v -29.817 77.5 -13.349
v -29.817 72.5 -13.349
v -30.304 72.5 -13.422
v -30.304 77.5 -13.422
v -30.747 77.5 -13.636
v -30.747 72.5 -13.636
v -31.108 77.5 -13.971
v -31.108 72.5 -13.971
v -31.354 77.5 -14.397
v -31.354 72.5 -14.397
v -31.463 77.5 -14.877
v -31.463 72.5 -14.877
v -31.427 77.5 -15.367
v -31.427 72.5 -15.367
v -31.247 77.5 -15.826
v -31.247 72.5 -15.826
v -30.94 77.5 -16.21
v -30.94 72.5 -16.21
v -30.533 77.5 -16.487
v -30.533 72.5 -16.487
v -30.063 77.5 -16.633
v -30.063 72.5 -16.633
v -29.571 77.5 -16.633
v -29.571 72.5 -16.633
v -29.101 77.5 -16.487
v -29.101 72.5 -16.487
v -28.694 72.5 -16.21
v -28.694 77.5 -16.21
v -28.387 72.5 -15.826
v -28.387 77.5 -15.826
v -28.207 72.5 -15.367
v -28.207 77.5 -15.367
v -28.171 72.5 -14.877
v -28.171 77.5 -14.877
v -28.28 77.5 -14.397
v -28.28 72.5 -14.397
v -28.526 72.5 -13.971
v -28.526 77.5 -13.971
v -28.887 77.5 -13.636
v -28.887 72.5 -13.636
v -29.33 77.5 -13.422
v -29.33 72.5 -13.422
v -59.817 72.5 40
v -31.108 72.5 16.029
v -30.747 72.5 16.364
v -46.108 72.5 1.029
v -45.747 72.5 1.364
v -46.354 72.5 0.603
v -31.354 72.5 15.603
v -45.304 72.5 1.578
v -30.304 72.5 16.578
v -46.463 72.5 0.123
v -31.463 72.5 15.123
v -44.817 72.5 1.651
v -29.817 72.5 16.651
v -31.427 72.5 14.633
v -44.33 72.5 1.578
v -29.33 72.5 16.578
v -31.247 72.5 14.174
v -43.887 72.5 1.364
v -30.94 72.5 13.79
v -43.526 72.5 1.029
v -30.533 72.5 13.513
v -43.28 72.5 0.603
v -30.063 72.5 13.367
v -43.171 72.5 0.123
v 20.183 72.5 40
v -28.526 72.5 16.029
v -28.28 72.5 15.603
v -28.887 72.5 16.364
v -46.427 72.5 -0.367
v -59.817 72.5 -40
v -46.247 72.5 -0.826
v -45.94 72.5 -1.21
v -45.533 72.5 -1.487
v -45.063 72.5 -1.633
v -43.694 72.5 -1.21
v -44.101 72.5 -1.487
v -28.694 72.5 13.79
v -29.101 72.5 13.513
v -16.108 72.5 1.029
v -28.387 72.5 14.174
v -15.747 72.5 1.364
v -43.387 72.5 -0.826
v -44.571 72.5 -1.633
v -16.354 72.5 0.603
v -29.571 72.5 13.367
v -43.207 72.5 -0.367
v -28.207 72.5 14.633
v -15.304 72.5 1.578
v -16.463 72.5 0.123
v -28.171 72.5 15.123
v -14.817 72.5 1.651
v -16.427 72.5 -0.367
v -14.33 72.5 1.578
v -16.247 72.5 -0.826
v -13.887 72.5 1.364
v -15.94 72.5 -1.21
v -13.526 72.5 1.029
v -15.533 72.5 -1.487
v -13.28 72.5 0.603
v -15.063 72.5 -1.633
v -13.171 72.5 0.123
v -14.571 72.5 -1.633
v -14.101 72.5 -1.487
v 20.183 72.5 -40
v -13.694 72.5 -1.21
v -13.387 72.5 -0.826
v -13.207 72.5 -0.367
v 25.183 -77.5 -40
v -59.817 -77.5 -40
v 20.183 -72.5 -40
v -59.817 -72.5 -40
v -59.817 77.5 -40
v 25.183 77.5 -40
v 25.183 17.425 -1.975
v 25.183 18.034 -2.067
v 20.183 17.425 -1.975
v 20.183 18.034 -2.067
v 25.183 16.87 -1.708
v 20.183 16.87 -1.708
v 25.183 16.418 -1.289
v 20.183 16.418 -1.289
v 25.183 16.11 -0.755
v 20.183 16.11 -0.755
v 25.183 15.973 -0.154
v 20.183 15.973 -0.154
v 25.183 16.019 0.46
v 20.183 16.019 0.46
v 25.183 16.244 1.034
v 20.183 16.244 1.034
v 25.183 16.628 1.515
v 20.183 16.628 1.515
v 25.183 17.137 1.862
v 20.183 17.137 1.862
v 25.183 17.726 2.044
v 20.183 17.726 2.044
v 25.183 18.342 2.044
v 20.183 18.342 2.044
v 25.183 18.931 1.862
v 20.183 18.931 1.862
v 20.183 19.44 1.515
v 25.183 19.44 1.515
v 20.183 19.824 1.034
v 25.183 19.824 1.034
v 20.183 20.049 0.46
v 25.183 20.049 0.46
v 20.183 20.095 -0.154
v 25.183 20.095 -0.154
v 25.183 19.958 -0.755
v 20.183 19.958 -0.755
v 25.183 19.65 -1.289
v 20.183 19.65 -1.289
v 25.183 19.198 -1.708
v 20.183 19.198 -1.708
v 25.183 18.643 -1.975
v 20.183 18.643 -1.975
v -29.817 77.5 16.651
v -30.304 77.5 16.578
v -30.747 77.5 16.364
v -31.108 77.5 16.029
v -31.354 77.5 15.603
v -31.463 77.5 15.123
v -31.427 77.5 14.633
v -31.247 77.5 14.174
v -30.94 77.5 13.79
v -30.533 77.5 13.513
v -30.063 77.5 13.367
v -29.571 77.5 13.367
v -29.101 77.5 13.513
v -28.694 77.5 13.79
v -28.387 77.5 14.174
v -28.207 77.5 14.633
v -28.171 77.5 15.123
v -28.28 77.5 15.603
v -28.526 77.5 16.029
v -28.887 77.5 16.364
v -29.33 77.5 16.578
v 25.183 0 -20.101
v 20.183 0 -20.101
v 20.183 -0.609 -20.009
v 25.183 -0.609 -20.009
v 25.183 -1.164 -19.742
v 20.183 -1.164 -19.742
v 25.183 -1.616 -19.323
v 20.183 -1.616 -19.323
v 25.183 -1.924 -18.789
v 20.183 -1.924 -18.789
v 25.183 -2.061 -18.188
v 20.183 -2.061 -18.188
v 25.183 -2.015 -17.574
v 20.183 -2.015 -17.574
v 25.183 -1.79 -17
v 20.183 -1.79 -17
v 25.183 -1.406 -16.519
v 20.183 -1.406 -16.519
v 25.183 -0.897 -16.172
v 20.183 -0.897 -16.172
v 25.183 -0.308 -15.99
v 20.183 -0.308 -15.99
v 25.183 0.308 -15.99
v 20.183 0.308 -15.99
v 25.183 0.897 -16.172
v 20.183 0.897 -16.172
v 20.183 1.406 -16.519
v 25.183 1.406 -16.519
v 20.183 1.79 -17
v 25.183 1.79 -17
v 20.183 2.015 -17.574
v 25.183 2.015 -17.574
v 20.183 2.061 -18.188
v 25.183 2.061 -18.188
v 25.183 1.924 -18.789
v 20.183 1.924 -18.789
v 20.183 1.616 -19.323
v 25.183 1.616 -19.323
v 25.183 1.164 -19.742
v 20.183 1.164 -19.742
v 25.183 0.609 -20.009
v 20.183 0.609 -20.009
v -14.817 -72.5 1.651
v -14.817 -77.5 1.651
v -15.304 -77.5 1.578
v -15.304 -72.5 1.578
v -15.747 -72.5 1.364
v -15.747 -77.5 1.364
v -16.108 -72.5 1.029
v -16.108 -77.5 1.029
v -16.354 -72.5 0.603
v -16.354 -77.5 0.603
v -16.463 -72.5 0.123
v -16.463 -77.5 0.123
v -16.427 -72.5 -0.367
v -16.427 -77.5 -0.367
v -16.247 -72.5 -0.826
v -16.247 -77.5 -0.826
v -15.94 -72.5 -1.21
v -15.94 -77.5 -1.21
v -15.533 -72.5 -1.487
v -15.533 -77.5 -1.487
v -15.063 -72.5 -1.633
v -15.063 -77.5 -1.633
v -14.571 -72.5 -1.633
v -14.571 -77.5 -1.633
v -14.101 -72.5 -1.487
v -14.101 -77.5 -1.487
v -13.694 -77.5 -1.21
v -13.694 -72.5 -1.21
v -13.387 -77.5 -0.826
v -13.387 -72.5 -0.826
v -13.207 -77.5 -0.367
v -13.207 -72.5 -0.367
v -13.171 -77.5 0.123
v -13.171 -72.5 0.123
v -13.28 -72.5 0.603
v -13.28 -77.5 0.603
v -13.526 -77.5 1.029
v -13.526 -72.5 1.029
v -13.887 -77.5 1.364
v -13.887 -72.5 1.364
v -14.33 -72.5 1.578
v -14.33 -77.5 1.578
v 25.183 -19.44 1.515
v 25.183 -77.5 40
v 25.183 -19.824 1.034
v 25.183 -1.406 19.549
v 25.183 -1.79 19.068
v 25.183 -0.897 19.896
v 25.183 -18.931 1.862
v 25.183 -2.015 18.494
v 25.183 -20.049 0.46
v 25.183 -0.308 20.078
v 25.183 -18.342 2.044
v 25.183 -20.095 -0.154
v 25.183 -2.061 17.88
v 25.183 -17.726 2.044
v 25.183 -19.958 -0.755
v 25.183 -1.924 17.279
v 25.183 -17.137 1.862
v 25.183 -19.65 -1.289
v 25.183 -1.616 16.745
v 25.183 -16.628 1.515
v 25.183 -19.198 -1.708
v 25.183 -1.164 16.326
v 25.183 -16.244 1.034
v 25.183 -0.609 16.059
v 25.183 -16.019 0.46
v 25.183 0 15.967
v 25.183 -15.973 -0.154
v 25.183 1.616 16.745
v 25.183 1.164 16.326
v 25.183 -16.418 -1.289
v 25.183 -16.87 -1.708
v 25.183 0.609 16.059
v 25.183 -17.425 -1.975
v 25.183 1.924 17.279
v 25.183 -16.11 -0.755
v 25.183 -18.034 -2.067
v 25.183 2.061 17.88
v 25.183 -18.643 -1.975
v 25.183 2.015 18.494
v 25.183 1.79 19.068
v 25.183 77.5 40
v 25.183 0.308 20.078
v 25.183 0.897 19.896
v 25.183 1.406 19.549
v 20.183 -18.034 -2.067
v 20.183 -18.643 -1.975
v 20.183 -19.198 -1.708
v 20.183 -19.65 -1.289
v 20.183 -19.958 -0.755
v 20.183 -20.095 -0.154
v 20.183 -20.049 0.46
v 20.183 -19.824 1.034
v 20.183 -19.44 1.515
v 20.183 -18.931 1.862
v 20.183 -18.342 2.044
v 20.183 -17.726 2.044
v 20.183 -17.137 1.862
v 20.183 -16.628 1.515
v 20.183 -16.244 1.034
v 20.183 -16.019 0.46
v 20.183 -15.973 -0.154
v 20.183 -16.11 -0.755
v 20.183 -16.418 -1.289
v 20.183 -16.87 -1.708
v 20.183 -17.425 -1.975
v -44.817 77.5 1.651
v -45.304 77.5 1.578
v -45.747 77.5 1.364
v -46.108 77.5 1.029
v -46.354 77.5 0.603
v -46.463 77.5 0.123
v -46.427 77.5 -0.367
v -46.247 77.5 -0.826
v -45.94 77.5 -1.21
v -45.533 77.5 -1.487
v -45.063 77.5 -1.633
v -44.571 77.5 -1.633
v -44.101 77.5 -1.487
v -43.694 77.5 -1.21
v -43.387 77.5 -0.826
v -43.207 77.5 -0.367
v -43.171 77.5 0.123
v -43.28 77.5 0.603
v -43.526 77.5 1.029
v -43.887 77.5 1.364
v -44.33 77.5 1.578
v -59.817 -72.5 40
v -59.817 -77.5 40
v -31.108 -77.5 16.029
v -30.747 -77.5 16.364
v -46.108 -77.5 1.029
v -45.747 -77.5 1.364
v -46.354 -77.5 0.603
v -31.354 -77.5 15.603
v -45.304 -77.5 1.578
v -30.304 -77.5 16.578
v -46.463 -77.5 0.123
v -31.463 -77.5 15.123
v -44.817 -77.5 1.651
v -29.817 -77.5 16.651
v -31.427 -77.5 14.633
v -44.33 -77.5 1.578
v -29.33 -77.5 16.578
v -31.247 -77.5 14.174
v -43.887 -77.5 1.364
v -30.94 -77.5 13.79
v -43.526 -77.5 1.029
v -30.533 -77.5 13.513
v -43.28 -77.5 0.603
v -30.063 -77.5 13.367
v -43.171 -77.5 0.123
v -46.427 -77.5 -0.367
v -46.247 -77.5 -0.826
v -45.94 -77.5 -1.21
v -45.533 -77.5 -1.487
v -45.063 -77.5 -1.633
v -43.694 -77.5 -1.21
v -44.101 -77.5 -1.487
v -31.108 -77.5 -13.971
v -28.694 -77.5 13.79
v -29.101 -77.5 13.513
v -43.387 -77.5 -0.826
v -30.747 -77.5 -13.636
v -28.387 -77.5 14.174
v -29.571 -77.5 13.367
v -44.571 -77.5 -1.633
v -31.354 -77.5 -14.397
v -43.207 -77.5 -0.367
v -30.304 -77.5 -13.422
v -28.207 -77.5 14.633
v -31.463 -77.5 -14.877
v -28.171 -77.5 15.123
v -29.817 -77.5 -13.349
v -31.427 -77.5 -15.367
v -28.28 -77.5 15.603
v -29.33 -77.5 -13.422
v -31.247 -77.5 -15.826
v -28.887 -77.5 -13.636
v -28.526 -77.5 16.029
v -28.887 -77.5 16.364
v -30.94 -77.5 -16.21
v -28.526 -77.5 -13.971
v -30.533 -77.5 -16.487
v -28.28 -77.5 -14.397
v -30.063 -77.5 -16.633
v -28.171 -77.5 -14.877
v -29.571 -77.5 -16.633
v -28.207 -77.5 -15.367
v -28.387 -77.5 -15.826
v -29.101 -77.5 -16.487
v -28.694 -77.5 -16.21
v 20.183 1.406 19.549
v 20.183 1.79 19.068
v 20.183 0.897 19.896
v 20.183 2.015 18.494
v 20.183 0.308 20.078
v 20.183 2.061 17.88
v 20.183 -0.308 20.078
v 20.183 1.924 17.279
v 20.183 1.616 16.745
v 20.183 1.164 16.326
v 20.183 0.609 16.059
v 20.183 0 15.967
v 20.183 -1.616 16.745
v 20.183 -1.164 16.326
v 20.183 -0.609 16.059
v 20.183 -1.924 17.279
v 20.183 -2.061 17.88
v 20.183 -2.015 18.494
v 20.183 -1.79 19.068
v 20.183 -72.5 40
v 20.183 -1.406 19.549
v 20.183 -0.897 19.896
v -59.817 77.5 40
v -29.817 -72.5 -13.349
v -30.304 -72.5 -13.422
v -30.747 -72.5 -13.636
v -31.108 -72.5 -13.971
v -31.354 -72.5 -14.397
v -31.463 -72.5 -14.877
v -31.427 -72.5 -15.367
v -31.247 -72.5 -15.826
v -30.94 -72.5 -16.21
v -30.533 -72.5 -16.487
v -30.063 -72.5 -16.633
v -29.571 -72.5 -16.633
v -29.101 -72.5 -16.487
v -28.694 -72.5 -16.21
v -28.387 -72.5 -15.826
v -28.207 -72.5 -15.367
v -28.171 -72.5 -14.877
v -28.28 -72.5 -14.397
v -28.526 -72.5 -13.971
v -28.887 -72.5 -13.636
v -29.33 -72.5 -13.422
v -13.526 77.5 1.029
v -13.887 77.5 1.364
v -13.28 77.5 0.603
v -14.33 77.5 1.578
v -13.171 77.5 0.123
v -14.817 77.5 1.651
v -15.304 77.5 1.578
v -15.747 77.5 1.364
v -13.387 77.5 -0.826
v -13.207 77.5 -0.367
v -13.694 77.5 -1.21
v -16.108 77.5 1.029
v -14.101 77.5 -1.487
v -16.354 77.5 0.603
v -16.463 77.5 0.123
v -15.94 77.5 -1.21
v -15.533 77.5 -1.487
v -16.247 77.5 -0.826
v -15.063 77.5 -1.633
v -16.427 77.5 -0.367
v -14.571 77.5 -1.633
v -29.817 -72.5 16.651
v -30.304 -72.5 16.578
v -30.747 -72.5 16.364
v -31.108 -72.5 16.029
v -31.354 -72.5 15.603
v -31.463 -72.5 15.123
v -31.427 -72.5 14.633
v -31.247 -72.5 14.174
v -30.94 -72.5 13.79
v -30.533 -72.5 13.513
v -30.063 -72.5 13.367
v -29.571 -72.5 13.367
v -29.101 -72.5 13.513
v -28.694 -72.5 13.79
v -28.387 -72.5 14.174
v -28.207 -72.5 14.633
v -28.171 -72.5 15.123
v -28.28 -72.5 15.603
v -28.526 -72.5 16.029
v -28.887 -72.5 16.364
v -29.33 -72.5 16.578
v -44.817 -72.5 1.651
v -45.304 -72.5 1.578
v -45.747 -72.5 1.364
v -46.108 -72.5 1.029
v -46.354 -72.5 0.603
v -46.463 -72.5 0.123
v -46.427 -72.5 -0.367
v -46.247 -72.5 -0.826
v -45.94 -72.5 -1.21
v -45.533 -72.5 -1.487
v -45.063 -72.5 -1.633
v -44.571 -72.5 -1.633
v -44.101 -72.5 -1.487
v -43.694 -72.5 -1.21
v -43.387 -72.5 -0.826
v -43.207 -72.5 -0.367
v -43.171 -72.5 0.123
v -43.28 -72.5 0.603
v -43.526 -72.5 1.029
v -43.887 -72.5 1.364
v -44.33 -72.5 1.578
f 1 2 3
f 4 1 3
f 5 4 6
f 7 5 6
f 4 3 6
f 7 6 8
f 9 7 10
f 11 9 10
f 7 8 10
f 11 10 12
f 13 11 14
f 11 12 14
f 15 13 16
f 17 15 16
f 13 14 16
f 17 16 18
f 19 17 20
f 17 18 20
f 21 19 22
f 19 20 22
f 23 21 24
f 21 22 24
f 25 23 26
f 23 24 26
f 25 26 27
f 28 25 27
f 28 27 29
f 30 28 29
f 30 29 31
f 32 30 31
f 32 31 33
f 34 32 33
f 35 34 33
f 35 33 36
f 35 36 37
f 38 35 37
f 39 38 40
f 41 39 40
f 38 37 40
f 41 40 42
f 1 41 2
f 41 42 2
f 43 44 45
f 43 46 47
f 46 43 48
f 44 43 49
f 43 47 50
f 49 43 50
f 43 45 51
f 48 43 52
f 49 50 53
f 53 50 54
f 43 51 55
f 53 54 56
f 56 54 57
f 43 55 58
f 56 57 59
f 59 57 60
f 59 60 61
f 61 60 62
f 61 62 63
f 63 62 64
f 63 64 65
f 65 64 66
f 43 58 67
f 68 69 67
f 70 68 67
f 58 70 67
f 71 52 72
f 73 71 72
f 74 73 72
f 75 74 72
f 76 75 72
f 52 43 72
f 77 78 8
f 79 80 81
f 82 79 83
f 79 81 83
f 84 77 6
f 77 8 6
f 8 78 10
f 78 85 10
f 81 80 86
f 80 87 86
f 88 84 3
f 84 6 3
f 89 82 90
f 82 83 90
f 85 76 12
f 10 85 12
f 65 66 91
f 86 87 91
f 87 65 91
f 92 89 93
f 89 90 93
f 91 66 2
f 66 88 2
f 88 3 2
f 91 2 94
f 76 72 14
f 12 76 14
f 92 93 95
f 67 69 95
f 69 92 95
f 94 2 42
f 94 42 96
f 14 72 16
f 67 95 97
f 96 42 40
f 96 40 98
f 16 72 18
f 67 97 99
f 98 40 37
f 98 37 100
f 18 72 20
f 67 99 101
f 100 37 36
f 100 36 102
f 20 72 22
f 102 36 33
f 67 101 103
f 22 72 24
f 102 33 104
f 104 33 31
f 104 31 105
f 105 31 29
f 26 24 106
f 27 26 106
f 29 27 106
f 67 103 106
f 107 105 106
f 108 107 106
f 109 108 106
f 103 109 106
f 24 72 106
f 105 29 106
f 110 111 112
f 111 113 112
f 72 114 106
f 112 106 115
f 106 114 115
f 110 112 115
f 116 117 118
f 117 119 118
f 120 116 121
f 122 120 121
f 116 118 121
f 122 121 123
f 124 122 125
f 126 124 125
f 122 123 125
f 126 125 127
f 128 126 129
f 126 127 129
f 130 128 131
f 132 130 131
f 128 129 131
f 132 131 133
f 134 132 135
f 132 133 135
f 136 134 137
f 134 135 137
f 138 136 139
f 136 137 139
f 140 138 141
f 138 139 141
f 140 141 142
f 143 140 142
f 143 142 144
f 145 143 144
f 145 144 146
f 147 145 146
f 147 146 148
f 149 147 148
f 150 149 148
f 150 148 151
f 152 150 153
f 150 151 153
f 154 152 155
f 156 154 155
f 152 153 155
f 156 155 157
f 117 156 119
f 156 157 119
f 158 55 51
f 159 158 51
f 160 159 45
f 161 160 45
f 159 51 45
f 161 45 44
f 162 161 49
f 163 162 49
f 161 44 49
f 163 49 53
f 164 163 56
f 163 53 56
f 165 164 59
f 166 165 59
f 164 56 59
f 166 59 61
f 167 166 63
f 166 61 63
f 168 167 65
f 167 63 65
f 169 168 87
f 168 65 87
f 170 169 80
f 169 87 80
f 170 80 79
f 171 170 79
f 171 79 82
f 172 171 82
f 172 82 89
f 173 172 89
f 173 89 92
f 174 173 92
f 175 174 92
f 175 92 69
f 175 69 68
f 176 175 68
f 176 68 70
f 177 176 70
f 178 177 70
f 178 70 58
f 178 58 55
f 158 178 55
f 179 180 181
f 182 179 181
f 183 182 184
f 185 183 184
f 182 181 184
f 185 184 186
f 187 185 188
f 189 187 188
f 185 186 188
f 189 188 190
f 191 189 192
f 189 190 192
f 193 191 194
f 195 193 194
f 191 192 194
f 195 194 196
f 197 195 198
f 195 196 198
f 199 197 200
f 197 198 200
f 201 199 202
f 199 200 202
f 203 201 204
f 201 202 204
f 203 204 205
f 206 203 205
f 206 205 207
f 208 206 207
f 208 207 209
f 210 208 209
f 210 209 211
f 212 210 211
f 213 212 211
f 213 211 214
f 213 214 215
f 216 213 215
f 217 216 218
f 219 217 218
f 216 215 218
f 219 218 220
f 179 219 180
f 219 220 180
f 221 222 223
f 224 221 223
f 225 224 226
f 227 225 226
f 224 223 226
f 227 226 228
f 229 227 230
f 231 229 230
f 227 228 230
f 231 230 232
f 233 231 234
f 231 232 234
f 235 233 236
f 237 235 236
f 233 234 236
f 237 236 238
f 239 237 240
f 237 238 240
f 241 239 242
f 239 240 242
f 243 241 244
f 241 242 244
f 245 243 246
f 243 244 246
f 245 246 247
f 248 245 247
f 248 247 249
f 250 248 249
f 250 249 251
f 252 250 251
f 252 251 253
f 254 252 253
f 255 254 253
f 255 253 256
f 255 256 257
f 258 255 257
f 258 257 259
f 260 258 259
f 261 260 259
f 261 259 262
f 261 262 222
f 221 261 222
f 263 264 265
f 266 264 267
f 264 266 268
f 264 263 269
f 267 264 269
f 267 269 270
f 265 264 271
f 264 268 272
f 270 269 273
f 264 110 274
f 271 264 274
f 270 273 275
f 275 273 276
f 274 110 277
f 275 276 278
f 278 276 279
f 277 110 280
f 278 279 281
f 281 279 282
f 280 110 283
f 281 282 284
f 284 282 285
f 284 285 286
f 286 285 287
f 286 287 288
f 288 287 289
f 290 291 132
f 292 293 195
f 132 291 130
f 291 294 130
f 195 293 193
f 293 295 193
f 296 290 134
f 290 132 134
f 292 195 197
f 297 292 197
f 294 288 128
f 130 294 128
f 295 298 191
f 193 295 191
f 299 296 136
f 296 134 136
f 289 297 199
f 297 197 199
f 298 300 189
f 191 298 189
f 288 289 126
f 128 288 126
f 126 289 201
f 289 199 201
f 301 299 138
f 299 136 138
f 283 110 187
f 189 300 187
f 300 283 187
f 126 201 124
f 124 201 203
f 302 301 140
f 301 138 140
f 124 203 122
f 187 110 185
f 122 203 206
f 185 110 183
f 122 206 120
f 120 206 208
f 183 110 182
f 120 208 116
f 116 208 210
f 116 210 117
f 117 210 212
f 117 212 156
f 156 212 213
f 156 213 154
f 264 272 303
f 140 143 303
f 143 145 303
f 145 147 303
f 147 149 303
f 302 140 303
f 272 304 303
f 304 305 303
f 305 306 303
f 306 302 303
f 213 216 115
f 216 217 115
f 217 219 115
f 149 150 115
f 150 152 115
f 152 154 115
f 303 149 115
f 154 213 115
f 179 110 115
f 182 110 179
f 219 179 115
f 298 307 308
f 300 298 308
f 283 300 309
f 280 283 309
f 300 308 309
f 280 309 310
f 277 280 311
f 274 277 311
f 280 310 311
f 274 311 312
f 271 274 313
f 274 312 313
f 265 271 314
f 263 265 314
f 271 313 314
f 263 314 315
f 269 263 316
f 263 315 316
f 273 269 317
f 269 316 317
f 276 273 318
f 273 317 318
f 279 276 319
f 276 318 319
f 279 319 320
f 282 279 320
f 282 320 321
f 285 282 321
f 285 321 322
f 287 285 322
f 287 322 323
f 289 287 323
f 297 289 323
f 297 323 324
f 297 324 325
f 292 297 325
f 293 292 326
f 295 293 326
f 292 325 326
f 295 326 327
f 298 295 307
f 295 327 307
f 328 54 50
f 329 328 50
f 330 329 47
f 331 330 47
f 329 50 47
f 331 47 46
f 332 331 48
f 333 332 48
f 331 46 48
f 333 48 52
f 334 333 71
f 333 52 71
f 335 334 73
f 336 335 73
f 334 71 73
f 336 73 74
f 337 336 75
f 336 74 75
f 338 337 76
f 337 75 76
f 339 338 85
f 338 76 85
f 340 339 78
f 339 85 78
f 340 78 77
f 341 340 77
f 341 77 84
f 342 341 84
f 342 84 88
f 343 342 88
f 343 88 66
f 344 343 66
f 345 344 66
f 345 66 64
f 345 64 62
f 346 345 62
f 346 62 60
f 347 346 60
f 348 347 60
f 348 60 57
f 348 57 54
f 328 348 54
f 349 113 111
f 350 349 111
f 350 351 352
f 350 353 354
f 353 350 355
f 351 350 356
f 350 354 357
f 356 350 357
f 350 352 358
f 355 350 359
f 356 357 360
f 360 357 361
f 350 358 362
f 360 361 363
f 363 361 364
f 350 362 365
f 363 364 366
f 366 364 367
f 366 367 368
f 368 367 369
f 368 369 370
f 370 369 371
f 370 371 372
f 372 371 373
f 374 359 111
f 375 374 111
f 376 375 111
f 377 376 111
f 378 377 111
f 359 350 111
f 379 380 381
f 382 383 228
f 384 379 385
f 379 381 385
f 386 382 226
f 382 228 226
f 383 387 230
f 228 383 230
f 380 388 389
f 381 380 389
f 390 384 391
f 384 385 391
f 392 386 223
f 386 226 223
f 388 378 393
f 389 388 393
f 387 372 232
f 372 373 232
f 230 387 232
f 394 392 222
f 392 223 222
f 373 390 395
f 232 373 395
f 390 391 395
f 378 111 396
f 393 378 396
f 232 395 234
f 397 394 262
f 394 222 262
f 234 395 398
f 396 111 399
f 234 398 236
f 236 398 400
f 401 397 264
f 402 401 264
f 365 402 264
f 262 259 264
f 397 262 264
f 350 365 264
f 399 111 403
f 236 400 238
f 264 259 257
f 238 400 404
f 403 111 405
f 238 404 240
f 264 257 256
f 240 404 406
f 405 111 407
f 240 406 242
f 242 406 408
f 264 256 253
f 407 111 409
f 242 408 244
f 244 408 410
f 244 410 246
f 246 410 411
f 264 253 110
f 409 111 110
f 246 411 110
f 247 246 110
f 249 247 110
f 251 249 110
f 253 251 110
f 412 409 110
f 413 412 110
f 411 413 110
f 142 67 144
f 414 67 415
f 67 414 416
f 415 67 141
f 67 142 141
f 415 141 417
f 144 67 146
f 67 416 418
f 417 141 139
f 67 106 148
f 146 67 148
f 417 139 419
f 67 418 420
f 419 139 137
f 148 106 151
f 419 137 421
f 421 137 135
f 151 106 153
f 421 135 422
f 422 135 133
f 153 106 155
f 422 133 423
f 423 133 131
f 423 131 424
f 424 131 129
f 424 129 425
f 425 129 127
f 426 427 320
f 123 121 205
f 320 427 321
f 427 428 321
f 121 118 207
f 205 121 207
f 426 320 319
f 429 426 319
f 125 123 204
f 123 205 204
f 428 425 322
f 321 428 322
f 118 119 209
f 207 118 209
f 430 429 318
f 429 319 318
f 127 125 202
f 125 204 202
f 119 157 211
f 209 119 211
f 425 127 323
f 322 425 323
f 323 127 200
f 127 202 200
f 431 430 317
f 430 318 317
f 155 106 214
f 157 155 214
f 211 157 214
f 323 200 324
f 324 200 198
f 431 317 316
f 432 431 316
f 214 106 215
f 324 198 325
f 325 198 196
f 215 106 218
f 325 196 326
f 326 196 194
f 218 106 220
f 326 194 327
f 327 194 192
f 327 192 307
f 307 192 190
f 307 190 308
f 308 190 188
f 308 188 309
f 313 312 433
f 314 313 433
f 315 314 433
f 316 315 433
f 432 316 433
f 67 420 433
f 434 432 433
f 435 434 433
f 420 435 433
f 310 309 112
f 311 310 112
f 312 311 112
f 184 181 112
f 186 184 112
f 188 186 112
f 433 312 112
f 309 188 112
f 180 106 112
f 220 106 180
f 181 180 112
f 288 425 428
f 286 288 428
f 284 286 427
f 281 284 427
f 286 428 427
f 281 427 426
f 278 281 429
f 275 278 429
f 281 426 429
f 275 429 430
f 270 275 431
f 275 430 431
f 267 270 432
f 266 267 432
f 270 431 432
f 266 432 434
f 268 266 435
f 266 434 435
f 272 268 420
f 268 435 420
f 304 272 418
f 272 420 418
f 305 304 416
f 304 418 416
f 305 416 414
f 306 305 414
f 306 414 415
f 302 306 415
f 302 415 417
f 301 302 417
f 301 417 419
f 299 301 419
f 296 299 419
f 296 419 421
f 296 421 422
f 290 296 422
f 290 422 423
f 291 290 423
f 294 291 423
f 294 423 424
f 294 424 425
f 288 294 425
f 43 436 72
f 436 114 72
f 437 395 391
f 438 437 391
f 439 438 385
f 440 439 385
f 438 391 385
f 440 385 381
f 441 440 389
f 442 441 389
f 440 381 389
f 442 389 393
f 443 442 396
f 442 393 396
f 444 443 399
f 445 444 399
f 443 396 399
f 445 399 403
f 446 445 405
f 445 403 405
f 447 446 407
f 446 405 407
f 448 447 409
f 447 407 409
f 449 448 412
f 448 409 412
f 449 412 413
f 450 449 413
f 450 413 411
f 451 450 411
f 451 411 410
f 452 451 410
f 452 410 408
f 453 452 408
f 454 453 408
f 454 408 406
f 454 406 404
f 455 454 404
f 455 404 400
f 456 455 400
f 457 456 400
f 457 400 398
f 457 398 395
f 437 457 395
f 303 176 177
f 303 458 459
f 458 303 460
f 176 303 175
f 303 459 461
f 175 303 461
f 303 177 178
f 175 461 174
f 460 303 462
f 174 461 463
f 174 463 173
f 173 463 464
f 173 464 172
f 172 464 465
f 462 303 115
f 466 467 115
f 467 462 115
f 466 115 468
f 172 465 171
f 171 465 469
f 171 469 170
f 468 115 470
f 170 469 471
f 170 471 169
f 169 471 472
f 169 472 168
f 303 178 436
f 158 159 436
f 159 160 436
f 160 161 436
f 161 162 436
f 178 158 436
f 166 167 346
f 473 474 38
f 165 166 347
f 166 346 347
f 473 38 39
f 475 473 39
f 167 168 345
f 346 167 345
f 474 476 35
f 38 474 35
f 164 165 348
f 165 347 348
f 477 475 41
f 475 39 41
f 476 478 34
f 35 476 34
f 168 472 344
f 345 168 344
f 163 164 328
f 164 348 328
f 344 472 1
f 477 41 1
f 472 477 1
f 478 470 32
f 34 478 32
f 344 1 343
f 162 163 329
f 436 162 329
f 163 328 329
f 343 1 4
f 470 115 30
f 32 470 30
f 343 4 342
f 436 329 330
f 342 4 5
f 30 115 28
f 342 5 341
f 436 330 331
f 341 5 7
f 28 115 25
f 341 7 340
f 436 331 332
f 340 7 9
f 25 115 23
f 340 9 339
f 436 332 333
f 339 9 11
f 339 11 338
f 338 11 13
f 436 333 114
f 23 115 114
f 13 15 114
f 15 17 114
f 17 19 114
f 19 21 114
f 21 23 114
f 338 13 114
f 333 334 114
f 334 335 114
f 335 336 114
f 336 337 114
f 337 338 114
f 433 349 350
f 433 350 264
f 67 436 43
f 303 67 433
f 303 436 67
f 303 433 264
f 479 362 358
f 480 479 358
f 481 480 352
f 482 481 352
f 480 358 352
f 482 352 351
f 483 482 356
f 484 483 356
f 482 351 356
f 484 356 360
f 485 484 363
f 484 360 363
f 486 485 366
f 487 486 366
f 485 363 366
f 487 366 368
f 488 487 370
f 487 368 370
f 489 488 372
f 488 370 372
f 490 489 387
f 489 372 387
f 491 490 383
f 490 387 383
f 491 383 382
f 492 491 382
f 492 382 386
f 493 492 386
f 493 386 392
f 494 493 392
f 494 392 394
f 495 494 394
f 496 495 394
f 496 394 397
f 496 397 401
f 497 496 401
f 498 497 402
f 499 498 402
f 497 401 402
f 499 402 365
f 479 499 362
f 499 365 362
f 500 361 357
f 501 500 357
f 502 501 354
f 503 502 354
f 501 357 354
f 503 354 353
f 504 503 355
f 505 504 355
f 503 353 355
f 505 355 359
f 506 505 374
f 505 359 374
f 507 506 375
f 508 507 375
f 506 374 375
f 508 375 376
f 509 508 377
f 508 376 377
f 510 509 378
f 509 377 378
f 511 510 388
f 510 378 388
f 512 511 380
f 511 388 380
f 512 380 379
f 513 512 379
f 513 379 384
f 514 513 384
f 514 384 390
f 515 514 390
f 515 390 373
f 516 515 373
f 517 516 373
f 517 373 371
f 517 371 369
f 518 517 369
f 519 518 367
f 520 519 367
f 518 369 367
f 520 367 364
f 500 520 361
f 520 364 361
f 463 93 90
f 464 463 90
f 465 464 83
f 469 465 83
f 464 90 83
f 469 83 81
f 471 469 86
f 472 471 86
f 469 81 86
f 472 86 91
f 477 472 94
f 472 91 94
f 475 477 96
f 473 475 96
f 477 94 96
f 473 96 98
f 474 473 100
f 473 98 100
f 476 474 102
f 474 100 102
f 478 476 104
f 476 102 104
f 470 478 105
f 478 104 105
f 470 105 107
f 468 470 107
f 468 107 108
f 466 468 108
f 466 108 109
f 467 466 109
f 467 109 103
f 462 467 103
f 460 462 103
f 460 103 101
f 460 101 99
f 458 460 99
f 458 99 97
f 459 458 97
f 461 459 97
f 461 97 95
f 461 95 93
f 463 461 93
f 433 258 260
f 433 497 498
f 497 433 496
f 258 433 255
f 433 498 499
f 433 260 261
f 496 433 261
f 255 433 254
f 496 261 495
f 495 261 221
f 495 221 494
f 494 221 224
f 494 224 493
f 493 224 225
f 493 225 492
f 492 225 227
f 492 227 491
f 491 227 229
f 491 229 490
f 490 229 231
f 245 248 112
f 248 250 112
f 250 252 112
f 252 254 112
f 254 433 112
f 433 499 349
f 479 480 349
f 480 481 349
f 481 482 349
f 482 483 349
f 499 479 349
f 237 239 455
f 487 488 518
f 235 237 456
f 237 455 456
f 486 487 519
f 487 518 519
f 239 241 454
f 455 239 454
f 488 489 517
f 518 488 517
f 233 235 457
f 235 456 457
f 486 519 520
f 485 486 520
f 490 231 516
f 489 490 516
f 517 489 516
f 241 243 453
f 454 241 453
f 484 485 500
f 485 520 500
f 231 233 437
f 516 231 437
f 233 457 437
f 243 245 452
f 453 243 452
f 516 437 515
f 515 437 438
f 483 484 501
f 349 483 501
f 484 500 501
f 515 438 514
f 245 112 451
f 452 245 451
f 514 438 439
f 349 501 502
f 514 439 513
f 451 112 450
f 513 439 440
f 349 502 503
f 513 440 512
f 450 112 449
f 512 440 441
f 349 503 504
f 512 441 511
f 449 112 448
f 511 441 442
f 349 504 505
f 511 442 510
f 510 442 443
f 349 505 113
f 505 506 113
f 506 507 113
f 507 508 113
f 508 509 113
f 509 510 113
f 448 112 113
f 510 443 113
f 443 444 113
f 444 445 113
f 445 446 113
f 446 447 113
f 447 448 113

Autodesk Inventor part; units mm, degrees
ref_plane "YZ Plane" through (0, 0, 0) normal (1, 0, 0) x (0, 1, 0)
ref_plane "XZ Plane" through (0, 0, 0) normal (0, 1, 0) x (-1, 0, 0)
ref_plane "XY Plane" through (0, 0, 0) normal (0, 0, 1) x (1, 0, 0)
sketch "Sketch1" plane through (0, 0, 0) normal (0, 0, 1) x (1, 0, 0)
  line L0 (20.183, 72.5) -> (20.183, -72.5)
  line L1 (20.183, 72.5) -> (165.183, 72.5) construction
  line L2 (20.183, -72.5) -> (-59.817, -72.5)
  line L3 (-59.817, -72.5) -> (-59.817, -77.5)
  line L4 (-59.817, -72.5) -> (-54.817, -72.5) construction
  line L5 (-59.817, -77.5) -> (25.183, -77.5)
  line L6 (25.183, -77.5) -> (25.183, 77.5)
  line L7 (25.183, 77.5) -> (-59.817, 77.5)
  line L8 (-59.817, 77.5) -> (-59.817, 72.5)
  line L9 (-59.817, 72.5) -> (20.183, 72.5)
  point P0 (0, 0)
  dimension "d0" = 145
  dimension "d1" = 90
  dimension "d2" = 80
  dimension "d3" = 90
  dimension "d4" = 5
  dimension "d5" = 90
  dimension "d6" = 85
  dimension "d7" = 90
  dimension "d8" = 155
  dimension "d9" = 90
  dimension "d10" = 85
  dimension "d11" = 90
  dimension "d12" = 5
  dimension "d13" = 90
  dimension "d45" = 72.5
extrude "Extrusion1" add sketch "Sketch1" along normal mid plane 80
sketch "Sketch2" plane through (25.183, -77.5, 40) normal (1, 0, 0) x (0, 0, -1)
  line L0 (0, 0) -> (0, 155) projected
  line L1 (0, 150) -> (0, 5) projected
  line L2 (0, 77.5) -> (80, 77.5) construction
  line L3 (80, 5) -> (80, 150) projected
  line L4 (80, 0) -> (0, 0) projected
  line L5 (40, 37.5) -> (40, 117.5) construction
  line L6 (80, 77.5) -> (0, 77.5) construction
  line L7 (40, 117.5) -> (40, 37.5) construction
  point P0 (40, 77.5)
  point P1 (40, 95.534)
  point P2 (40, 77.5)
  point P3 (40, 77.5)
  point P4 (21.966, 77.5)
  point P5 (40, 77.5)
  point P6 (40, 59.466)
  point P7 (40, 77.5)
  point P8 (58.034, 77.5)
  dimension "d16" = 40
  dimension "d17" = 77.5
  dimension "d18" = 18.034
  dimension "d21" = 360
hole "Hole1" at (25.183, 18.034, 0) at (25.183, 0, 18.034) at (25.183, -18.034, 0) at (25.183, 0, -18.034) direction (-1, 0, 0) diameter 4.134 end through all thread size "M5x0.8" class "6H" standard "ANSI Metric M Profile"
sketch "Sketch3" plane through (-59.817, 77.5, 40) normal (0, 1, 0) x (1, 0, 0)
  line L0 (60, 80) -> (0, 80)
  line L1 (30, 80) -> (30, 0) construction
  line L2 (60, 0) -> (0, 0)
  line L3 (30, 80) -> (120, 80) construction
  line L4 (85, 80) -> (85, 0) projected
  line L5 (85, 0) -> (0, 0) projected
  line L6 (0, 80) -> (85, 80) projected
  point P0 (59.817, 40)
  point P1 (15, 40)
  point P2 (30, 40)
  point P3 (30, 25)
  point P4 (45, 40)
  point P5 (30, 55)
  dimension "d30" = 90
  dimension "d31" = 55
  dimension "d32" = 40
  dimension "d33" = 15
  dimension "d36" = 360
hole "Hole2" at (-14.817, 77.5, 0) at (-29.817, 77.5, 15) at (-44.817, 77.5, 0) at (-29.817, 77.5, -15) direction (0, -1, 0) diameter 3.302 end through all thread size "8-32 UNC" class "2B" standard "ANSI Unified Screw Threads"
properties part number "sidebracket"
